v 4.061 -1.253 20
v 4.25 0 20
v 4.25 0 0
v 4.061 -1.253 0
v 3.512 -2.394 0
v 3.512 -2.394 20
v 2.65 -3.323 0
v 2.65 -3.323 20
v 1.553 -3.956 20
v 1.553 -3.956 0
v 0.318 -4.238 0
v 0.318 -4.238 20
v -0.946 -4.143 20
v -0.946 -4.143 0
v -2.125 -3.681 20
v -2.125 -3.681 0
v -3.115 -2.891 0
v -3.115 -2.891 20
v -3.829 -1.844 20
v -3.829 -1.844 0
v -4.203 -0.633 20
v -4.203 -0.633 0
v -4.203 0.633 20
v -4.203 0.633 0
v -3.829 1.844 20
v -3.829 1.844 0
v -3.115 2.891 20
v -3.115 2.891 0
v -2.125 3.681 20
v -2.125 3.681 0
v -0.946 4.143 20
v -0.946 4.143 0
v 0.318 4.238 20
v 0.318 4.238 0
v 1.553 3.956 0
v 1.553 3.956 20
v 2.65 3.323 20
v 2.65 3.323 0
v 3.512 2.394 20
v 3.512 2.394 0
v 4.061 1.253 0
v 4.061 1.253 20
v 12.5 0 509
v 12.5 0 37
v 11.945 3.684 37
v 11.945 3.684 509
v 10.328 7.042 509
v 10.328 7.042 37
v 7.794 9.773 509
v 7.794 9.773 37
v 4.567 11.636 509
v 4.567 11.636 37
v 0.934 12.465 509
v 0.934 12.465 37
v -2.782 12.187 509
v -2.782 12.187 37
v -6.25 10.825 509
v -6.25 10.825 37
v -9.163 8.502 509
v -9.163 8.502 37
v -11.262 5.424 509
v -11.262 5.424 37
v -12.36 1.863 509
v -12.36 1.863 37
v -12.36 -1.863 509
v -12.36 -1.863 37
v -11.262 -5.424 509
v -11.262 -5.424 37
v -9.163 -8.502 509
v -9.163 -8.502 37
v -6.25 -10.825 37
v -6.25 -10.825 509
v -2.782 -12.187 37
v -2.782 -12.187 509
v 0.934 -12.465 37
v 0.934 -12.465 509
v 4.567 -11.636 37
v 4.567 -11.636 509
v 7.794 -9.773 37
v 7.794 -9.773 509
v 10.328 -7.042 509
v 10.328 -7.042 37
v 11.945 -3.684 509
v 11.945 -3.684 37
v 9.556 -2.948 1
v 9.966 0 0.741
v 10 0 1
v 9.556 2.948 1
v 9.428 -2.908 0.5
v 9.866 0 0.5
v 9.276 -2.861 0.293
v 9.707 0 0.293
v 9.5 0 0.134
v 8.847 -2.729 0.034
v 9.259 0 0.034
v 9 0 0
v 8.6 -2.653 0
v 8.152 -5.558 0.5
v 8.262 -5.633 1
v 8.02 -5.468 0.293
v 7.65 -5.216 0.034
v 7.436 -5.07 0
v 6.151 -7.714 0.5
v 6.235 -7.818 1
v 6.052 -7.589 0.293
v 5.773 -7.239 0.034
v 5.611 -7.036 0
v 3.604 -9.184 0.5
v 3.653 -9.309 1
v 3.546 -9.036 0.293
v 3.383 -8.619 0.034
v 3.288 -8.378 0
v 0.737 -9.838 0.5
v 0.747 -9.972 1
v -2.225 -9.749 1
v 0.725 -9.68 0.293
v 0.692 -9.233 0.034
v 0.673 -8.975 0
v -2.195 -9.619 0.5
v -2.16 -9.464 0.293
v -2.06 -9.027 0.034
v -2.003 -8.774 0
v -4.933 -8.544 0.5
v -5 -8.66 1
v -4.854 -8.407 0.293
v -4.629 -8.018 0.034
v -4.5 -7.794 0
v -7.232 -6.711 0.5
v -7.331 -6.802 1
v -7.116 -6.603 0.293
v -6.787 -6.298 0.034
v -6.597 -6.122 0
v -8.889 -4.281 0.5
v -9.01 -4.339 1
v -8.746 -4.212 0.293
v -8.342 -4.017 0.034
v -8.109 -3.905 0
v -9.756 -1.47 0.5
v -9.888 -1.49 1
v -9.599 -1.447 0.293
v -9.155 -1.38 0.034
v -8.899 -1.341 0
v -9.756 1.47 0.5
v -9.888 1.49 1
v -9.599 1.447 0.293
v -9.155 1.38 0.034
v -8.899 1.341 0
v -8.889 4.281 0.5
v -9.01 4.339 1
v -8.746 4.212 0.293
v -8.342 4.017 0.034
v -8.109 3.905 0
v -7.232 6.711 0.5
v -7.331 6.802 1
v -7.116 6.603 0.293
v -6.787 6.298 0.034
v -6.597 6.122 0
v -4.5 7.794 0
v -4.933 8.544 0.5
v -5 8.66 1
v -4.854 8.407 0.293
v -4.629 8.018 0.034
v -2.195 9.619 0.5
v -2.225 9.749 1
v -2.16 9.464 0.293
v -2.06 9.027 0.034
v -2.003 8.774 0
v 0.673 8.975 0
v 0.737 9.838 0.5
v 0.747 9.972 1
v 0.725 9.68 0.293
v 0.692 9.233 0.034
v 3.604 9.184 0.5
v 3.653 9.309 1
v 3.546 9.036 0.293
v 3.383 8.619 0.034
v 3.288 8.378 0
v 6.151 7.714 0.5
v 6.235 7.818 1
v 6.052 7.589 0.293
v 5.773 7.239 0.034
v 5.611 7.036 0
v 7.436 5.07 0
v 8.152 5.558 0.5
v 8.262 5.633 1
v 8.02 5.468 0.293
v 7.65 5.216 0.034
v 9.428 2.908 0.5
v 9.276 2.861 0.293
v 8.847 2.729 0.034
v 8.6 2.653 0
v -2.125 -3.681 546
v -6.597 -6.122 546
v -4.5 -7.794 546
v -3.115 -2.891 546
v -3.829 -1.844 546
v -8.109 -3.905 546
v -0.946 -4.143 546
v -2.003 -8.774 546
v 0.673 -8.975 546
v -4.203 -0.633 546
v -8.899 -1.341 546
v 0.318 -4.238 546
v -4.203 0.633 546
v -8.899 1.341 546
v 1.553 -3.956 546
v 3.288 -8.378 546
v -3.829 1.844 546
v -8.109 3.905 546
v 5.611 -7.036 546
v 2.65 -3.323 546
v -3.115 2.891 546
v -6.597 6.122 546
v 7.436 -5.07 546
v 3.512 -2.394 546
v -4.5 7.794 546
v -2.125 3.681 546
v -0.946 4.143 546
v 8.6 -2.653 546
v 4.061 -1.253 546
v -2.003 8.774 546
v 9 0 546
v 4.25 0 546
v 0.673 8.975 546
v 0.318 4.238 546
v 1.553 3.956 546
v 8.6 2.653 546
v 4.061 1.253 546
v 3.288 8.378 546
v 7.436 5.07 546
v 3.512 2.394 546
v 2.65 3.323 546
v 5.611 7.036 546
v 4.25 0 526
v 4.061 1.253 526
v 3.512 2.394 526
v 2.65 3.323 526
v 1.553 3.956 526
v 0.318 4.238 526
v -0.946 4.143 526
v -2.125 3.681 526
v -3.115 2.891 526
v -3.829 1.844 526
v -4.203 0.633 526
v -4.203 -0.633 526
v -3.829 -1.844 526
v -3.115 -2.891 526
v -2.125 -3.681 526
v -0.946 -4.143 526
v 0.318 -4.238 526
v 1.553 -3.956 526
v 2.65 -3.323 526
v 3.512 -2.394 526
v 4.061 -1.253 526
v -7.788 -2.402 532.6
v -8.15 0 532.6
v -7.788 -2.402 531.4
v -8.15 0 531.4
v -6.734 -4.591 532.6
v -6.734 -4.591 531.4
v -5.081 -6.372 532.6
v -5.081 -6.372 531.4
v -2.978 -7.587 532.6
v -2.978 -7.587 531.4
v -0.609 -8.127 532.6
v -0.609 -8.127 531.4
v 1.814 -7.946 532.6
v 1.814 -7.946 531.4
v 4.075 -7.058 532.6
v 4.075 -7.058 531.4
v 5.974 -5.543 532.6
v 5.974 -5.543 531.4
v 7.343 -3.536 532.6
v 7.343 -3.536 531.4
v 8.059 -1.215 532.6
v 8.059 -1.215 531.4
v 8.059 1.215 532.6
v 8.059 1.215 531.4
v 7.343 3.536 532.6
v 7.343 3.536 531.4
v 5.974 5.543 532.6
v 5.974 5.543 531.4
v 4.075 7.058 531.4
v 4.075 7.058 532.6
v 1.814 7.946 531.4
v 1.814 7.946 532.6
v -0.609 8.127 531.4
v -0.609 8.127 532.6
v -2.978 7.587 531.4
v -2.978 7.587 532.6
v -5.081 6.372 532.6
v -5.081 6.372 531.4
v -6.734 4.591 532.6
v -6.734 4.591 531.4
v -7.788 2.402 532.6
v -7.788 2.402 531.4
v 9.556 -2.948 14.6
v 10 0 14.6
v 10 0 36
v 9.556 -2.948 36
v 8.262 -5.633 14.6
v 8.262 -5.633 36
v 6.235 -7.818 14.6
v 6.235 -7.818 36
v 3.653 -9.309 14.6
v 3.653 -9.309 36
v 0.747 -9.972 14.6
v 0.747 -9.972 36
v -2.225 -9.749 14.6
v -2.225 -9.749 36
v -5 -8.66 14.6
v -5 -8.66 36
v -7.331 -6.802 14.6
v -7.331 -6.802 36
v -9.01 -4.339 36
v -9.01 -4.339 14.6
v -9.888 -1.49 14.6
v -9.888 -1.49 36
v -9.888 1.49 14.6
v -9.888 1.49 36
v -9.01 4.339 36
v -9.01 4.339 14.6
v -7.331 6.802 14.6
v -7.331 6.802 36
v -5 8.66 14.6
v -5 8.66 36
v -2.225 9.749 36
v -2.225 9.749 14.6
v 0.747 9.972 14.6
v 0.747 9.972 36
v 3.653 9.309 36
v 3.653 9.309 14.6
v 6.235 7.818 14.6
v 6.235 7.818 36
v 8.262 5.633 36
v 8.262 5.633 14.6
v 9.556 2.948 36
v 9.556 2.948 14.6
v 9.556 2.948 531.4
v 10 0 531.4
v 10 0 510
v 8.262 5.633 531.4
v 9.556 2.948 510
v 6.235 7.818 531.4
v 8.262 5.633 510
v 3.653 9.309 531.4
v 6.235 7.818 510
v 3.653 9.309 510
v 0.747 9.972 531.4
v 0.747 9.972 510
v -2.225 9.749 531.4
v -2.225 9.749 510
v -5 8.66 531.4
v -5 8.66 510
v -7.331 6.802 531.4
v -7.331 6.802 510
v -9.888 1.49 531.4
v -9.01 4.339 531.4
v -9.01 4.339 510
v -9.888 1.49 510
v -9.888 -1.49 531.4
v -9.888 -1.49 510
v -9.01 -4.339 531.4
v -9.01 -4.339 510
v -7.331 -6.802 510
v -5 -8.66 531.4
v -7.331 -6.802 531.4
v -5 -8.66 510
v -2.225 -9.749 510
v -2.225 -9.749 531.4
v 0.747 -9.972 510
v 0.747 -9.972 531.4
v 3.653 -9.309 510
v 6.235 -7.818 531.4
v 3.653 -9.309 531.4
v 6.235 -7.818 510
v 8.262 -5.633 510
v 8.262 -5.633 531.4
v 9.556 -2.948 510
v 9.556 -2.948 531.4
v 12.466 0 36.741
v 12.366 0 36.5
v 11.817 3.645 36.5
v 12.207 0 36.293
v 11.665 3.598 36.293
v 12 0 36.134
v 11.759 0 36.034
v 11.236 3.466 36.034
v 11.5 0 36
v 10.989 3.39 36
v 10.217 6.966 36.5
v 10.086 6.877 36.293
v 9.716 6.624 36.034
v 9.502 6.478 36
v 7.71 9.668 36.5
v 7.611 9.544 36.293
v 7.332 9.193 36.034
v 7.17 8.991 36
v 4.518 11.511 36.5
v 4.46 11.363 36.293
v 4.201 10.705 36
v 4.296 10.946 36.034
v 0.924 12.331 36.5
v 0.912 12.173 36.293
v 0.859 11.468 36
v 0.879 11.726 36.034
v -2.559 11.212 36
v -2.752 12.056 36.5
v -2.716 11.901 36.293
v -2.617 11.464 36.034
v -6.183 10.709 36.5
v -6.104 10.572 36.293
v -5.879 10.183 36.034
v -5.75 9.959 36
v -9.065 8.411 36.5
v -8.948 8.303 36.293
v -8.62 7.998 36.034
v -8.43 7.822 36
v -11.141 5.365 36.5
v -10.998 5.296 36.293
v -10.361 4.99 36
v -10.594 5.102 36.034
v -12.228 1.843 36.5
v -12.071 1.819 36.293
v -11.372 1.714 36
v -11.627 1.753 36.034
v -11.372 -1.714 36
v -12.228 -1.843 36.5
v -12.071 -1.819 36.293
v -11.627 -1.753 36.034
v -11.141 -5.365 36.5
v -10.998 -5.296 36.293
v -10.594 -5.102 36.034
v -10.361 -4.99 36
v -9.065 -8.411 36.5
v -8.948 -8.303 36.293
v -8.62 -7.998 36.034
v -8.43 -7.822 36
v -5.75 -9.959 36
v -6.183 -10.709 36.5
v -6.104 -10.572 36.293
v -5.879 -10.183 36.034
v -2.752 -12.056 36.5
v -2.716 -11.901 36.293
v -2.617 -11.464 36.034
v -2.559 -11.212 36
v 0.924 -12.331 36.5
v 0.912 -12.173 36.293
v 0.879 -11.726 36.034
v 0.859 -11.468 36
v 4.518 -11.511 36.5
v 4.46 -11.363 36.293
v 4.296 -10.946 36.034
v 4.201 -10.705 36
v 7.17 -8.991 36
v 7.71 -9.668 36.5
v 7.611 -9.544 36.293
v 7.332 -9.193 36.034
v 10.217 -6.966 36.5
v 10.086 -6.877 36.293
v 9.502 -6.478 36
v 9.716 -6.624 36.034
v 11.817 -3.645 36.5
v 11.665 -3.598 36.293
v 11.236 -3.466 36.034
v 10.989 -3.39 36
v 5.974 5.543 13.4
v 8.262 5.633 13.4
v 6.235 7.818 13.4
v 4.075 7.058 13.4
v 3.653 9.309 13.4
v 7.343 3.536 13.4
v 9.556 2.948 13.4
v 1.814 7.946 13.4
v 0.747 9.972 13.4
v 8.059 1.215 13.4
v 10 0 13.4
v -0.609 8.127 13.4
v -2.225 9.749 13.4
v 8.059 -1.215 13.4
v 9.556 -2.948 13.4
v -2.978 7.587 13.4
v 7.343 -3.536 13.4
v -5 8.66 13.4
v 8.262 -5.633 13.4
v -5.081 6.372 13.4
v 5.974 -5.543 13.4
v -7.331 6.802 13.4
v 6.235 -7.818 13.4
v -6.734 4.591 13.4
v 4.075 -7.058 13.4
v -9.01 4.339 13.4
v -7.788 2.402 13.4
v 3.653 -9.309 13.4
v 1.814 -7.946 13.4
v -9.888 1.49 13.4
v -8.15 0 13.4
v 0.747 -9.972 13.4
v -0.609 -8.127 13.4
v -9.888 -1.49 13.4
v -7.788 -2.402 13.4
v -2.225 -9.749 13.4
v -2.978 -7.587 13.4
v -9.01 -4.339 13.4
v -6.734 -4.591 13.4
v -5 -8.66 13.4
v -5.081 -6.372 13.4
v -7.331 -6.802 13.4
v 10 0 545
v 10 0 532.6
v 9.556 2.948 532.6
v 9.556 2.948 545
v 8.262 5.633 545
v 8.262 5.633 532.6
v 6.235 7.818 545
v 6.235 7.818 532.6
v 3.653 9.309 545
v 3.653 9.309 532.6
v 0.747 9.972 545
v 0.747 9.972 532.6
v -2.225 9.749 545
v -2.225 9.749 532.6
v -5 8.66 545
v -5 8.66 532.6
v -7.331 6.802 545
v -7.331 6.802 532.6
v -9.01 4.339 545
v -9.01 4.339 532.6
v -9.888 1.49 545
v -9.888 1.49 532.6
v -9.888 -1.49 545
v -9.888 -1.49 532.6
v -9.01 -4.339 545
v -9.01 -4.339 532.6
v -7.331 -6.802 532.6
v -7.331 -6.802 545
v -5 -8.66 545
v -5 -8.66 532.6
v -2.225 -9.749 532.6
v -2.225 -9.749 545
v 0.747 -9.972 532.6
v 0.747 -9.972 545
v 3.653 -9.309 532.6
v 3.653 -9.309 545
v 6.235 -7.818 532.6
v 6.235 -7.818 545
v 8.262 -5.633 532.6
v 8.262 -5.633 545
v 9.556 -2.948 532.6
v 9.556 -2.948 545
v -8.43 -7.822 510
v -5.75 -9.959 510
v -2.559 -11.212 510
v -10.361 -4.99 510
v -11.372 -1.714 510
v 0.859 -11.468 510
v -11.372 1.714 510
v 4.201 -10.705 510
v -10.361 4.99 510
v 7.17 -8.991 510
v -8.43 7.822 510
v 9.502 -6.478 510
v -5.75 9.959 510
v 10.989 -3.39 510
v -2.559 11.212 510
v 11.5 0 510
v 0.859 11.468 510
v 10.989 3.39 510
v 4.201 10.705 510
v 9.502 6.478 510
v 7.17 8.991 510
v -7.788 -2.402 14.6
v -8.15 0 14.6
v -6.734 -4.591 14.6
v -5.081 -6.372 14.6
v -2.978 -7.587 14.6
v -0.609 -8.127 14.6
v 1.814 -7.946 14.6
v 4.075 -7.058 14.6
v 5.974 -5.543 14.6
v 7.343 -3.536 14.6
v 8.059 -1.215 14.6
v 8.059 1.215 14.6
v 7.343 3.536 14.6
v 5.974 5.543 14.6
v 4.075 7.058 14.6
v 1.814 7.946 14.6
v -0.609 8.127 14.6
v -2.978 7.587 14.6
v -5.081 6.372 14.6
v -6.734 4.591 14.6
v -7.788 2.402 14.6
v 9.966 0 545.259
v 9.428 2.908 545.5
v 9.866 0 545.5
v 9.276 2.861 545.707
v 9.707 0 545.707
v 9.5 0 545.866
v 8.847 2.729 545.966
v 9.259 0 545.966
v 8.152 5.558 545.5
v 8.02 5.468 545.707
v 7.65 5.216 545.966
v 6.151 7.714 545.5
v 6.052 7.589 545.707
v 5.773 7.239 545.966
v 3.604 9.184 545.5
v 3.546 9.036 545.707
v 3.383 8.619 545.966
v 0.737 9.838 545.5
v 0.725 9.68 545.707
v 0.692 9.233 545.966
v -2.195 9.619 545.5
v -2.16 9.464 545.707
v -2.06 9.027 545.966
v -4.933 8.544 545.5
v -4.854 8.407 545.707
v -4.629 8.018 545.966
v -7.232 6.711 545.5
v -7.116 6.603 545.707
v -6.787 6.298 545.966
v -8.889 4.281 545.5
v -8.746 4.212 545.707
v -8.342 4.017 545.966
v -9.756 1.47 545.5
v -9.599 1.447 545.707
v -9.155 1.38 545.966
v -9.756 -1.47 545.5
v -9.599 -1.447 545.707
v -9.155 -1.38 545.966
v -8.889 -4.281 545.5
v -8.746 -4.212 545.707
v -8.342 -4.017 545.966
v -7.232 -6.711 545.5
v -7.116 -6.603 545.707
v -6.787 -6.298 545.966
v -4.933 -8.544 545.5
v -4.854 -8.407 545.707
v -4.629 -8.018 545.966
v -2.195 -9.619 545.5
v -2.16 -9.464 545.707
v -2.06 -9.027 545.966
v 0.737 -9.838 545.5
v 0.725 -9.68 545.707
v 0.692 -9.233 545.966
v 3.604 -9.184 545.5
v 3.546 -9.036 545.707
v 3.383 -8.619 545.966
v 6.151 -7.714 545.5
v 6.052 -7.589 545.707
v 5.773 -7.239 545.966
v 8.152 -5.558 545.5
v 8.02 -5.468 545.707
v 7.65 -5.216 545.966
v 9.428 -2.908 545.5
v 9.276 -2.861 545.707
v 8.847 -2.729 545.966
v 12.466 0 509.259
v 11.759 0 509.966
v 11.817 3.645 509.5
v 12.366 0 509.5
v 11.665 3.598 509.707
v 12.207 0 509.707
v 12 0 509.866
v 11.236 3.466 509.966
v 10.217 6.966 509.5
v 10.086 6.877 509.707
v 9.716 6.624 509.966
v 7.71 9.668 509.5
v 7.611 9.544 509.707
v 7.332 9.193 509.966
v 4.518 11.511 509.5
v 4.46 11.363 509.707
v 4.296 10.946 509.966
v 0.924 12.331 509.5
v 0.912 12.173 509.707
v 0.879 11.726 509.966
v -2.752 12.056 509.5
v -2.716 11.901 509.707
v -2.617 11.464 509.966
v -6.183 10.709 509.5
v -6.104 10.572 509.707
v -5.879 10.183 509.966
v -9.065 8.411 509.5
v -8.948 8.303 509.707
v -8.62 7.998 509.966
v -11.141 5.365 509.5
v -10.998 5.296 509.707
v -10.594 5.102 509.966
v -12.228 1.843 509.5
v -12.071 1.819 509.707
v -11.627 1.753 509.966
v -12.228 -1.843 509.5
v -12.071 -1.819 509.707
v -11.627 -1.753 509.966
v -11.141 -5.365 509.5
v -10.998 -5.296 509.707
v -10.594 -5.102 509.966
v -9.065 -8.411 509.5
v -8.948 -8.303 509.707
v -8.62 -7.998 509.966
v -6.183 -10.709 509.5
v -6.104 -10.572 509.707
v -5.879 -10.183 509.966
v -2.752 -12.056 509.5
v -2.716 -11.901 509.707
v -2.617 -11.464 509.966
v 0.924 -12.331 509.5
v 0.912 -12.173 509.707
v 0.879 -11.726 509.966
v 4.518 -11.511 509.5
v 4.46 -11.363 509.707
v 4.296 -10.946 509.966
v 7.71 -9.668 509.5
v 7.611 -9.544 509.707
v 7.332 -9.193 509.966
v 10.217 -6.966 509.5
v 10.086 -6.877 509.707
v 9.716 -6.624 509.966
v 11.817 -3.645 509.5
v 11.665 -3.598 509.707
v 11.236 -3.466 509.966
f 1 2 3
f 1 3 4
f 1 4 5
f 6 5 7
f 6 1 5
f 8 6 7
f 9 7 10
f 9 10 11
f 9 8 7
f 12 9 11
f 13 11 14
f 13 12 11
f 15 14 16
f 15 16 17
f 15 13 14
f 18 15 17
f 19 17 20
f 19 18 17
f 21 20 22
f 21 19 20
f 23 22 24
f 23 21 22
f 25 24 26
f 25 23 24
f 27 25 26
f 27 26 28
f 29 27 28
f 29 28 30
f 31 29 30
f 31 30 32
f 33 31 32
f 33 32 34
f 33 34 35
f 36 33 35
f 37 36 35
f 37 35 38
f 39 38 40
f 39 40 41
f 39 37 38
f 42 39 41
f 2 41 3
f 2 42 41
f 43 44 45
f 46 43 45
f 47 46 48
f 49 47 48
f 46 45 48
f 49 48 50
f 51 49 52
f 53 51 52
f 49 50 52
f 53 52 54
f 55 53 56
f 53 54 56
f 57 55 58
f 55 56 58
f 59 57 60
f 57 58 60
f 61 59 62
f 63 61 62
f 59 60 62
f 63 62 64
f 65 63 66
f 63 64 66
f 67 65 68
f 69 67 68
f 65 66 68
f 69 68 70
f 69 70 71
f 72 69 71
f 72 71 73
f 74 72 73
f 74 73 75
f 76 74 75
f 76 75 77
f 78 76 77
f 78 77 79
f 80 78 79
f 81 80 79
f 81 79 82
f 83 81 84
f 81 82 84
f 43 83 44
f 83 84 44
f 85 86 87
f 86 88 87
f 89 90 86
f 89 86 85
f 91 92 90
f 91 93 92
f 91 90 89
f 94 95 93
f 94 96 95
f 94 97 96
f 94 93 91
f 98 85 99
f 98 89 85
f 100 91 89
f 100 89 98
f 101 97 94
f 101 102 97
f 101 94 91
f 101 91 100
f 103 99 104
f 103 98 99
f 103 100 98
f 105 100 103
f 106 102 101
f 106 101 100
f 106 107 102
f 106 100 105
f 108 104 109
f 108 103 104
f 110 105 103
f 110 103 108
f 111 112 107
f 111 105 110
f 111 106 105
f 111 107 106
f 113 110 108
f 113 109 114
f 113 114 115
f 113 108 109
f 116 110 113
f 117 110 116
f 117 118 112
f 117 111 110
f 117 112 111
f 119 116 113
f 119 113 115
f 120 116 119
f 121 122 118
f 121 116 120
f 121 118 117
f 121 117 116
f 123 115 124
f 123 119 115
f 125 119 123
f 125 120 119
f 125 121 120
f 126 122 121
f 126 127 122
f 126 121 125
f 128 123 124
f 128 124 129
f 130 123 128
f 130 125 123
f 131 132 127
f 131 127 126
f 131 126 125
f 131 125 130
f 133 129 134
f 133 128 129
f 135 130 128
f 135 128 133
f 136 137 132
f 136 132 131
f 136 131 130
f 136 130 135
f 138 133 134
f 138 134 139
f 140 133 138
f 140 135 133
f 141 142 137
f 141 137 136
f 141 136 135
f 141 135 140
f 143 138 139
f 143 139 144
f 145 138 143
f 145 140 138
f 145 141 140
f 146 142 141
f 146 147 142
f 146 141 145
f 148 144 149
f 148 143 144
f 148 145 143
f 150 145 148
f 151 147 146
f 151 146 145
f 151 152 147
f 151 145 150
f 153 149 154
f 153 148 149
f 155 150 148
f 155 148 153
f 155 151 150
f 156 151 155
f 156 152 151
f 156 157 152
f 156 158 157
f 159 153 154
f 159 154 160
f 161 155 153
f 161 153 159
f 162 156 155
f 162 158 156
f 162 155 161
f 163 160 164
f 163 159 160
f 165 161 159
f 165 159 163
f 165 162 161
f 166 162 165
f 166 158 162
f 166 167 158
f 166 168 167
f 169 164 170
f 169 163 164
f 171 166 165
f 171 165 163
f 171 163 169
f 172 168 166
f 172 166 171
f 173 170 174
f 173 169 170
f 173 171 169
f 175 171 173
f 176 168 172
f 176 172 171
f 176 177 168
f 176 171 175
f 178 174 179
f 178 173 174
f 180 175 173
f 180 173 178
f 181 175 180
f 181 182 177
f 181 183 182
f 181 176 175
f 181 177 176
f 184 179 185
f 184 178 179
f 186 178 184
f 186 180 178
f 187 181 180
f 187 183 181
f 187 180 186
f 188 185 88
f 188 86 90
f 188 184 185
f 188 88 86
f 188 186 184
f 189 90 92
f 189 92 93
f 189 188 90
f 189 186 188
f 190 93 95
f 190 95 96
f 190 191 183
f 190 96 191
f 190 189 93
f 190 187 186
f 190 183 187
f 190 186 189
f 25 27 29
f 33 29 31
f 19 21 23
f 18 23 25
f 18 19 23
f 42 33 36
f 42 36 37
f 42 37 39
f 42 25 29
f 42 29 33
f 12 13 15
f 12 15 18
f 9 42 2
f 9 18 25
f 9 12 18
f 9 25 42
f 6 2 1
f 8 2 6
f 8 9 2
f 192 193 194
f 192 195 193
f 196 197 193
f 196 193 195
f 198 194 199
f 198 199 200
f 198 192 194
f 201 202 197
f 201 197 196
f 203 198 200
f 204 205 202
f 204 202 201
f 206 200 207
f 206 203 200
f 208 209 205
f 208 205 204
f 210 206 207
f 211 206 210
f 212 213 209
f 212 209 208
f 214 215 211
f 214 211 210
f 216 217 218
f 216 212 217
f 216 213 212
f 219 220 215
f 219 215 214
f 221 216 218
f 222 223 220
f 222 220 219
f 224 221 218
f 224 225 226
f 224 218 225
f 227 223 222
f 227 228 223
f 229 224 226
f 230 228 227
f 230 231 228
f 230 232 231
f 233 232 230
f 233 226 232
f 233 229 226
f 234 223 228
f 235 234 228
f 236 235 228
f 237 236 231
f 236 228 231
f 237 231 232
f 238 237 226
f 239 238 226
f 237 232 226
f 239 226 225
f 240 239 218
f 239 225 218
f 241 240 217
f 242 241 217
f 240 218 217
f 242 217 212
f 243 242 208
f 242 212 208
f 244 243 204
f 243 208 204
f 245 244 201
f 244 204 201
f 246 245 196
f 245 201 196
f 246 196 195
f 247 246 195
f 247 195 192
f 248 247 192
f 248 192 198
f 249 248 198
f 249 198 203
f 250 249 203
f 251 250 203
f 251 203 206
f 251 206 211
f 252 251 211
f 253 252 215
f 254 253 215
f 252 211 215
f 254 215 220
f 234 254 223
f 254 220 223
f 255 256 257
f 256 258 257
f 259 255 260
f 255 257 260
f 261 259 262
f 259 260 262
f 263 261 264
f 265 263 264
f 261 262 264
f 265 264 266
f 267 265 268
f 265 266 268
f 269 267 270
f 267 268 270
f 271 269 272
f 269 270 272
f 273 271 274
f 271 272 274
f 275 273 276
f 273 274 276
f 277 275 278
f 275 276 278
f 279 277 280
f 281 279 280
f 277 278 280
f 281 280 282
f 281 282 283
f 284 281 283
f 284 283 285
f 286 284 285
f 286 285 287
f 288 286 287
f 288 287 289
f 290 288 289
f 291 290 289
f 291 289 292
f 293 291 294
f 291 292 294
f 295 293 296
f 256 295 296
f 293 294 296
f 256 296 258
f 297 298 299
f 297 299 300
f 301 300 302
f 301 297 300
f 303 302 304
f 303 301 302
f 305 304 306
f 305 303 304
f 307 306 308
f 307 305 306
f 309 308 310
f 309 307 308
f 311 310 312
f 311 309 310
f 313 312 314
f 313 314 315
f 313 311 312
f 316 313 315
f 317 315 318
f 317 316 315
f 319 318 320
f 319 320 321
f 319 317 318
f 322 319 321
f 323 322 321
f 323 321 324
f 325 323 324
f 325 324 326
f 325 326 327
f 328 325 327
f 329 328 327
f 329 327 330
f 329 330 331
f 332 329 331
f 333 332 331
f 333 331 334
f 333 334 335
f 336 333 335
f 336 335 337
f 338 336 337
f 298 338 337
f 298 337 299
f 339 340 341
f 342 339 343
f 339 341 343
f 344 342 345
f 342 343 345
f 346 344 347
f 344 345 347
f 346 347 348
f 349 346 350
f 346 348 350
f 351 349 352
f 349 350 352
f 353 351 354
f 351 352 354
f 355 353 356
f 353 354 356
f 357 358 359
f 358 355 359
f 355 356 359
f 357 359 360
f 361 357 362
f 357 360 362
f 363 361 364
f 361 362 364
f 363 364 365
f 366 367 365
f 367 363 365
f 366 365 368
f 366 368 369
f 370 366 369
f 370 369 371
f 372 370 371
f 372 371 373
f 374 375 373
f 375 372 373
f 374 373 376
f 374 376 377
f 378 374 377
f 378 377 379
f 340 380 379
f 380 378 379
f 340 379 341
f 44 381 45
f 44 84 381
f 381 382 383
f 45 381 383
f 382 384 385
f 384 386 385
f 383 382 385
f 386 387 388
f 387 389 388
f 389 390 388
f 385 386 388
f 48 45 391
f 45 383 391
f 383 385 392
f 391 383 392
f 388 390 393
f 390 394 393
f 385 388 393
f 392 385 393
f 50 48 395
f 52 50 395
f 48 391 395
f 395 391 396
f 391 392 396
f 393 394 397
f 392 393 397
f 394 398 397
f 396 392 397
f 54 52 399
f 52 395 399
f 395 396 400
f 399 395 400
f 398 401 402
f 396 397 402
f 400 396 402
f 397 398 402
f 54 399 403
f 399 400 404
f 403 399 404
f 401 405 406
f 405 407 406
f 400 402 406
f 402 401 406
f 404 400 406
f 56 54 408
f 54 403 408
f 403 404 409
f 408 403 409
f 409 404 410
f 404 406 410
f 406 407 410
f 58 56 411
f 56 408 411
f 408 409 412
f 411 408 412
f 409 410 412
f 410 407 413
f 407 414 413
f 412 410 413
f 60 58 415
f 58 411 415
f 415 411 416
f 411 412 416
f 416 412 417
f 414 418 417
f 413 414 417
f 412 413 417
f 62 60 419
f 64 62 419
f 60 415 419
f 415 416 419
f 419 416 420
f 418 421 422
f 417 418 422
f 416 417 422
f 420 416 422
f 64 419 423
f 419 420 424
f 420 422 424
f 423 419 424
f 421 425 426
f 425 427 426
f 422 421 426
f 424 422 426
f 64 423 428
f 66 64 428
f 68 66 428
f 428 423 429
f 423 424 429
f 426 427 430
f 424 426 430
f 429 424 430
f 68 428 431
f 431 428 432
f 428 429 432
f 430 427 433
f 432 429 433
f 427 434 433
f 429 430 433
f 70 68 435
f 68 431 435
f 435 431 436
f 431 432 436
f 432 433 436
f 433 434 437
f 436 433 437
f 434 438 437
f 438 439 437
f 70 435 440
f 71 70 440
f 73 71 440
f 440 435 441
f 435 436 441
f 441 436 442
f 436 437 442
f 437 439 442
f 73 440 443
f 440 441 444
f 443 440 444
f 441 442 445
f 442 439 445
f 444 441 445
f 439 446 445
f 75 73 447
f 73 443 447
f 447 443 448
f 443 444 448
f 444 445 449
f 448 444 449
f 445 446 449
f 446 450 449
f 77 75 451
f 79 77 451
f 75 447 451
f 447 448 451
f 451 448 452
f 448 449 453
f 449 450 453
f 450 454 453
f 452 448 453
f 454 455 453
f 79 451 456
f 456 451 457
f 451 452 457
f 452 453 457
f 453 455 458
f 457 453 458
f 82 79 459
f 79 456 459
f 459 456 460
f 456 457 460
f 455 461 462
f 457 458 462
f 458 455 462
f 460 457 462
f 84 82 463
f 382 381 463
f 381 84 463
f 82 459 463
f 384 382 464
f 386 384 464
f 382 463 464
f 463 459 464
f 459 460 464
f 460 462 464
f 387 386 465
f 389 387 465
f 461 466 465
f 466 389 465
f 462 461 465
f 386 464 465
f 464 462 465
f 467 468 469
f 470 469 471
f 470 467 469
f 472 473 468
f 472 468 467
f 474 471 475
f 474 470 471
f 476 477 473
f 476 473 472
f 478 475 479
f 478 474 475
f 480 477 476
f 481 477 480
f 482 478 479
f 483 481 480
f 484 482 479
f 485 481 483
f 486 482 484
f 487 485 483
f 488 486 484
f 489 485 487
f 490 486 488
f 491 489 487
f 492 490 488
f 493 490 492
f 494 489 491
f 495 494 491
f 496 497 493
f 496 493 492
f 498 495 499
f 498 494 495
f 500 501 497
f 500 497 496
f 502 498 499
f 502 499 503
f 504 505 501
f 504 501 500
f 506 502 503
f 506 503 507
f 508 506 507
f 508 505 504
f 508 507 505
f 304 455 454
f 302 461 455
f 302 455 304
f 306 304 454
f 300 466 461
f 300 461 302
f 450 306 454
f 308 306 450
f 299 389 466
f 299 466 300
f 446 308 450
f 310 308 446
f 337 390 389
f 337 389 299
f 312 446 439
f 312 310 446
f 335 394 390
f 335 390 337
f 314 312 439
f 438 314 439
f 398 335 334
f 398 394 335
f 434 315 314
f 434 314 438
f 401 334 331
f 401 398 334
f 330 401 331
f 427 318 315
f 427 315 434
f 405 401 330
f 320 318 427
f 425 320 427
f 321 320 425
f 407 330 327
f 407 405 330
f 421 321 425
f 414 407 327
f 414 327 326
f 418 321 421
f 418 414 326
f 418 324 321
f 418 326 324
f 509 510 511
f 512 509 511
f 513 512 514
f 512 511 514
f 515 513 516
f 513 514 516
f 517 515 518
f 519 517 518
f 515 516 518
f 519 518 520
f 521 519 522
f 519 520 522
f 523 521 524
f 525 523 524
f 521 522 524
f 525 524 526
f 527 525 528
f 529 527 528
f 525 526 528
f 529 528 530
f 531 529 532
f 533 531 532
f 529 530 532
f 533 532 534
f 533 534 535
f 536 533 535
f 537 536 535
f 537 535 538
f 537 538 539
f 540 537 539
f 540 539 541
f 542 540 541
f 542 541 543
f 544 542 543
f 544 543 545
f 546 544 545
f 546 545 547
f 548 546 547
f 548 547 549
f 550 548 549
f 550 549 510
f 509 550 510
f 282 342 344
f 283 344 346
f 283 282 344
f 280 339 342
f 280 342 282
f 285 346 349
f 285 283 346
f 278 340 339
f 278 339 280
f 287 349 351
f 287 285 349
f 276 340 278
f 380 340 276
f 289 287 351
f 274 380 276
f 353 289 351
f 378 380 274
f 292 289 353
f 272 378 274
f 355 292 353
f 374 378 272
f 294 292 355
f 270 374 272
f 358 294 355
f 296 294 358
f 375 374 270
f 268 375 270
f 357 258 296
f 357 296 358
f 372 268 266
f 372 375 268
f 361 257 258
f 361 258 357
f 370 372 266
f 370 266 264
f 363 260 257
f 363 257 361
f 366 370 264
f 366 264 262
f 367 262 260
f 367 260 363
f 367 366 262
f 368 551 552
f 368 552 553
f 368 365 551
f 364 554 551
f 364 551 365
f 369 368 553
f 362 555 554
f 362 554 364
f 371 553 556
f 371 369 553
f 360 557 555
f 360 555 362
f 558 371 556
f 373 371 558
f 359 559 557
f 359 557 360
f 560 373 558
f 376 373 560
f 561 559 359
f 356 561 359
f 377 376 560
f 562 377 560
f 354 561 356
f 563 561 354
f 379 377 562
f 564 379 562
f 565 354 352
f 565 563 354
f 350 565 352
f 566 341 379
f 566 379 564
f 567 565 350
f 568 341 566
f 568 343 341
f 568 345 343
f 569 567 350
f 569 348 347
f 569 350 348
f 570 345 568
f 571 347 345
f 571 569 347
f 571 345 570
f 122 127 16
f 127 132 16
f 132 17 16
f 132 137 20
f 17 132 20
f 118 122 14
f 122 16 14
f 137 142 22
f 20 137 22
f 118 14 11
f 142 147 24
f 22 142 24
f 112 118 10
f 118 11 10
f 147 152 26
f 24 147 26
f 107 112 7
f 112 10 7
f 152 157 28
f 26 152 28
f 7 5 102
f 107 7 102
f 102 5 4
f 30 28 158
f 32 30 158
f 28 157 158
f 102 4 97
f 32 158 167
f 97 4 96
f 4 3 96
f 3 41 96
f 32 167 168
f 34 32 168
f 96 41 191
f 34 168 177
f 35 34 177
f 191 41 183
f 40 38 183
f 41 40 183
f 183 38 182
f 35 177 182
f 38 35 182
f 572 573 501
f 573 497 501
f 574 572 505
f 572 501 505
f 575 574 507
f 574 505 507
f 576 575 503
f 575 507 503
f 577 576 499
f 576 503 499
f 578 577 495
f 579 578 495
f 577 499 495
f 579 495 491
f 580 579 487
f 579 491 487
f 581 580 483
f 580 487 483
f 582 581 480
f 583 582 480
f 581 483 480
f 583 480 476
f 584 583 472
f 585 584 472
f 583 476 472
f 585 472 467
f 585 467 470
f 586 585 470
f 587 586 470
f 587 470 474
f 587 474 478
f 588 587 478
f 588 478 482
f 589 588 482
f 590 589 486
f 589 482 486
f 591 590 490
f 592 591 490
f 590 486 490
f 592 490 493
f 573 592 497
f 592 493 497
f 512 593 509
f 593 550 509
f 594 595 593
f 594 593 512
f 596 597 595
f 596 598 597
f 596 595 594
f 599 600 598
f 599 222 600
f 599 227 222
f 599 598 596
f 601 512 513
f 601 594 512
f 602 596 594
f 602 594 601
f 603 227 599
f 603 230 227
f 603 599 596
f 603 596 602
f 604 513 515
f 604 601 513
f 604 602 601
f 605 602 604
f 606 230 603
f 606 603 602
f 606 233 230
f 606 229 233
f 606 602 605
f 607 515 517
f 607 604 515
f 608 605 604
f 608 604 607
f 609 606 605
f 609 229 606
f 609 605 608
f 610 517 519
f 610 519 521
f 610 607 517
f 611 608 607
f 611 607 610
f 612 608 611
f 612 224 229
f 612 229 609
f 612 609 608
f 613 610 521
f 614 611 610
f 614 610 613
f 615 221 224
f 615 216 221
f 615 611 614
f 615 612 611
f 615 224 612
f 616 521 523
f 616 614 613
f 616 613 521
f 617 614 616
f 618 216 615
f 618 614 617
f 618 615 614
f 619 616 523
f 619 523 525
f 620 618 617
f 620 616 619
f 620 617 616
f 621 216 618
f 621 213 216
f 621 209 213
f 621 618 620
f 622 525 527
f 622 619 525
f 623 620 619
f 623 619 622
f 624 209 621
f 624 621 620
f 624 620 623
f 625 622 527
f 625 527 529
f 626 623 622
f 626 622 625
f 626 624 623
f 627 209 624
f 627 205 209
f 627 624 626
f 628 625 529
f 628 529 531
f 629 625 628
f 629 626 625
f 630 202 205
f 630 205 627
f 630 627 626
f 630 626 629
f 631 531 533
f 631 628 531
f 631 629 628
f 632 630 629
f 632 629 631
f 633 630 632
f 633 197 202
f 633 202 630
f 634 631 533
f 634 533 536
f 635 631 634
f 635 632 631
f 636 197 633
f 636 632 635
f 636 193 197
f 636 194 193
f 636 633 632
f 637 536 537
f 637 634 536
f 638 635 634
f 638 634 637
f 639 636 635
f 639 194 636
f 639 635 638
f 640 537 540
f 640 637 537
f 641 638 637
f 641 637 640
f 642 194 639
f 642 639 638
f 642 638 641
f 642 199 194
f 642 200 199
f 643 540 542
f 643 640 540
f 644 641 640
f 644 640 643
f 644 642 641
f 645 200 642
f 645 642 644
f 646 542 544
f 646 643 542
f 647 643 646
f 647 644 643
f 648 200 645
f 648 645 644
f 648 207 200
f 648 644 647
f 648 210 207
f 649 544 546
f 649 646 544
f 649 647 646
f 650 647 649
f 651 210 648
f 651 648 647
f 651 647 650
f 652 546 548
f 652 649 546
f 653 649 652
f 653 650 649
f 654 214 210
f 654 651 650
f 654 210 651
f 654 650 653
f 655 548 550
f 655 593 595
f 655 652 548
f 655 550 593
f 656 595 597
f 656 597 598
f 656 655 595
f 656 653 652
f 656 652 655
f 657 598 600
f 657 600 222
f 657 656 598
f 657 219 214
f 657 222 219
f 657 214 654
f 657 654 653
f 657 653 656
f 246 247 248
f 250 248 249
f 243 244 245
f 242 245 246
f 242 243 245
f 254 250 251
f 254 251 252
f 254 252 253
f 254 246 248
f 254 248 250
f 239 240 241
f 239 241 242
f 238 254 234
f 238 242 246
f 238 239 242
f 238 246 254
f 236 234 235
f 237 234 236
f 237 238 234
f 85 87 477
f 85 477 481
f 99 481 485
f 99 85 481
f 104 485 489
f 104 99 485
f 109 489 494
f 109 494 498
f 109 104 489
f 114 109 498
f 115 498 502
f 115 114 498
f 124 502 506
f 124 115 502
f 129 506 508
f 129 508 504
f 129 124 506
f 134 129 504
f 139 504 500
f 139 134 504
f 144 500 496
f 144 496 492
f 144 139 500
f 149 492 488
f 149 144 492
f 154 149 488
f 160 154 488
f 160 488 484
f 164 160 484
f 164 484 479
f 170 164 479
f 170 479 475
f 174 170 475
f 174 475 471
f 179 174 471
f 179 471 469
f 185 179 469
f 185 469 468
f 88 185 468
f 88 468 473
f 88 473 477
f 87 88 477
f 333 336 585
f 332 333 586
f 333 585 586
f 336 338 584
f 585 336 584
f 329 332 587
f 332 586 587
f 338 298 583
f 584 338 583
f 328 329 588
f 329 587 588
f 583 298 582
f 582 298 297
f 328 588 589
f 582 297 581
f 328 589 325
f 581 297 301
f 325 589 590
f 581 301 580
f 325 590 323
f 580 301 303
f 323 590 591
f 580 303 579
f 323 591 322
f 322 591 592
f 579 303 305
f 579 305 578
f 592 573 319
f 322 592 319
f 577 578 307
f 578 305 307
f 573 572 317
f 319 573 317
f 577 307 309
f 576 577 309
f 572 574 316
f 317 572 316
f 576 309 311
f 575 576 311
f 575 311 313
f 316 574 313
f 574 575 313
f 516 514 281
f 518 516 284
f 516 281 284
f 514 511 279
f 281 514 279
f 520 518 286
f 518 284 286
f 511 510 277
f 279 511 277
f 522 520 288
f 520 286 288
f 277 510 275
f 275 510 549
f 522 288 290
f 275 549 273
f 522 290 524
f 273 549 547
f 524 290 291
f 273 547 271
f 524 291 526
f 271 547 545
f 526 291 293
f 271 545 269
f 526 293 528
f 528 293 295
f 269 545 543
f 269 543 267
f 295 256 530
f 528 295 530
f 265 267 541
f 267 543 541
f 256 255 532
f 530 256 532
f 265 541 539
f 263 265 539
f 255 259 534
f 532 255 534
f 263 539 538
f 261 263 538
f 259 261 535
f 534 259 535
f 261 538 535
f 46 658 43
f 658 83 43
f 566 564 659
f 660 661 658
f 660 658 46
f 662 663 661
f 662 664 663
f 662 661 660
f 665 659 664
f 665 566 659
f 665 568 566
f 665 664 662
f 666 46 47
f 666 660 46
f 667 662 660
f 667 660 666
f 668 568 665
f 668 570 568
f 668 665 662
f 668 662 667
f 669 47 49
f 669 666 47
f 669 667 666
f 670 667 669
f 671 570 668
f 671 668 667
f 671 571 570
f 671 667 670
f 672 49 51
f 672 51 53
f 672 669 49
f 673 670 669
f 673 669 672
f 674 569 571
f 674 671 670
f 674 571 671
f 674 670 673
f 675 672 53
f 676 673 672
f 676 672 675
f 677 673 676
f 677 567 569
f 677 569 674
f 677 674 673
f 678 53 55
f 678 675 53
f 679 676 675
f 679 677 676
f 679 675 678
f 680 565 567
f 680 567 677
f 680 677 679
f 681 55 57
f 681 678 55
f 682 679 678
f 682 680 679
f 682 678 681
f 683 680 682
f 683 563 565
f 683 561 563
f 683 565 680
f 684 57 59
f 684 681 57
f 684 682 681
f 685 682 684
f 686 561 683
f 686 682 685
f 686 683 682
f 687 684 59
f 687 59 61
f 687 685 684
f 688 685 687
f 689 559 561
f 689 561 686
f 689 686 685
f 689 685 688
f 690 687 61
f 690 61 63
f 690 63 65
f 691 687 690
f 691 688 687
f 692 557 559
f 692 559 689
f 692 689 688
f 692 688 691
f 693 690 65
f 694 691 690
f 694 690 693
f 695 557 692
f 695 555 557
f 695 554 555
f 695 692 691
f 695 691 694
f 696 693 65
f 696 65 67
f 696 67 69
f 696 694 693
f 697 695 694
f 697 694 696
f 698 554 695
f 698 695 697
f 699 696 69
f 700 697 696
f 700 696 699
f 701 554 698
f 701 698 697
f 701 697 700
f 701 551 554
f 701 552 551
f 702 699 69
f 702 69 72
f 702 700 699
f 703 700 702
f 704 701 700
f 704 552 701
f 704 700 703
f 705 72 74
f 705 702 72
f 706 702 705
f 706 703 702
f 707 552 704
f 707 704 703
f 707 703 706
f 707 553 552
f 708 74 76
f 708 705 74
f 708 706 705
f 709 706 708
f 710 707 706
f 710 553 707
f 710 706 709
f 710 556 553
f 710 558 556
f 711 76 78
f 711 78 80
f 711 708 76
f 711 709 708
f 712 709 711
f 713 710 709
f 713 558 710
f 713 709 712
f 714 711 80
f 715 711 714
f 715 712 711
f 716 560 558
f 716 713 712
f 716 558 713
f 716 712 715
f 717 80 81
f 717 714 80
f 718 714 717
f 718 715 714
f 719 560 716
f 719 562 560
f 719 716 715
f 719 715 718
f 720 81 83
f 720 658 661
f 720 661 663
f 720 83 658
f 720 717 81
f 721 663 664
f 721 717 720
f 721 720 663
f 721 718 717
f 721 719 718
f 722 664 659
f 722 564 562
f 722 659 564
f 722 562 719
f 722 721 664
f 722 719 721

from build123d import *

# Parameters (mm, degrees)
IZIM1_R                     = 12.5
Y_KSEKLIK_EKSTR_ZYON1_DEPTH = 546
IZIM2_R                     = 4.25
KES_EKSTR_ZYON1_DEPTH       = 20
KES_EKSTR_ZYON2_START       = -20
IZIM3_R                     = 4.25
KES_EKSTR_ZYON2_DEPTH       = 20
KES_EKSTR_ZYON3_START       = -36
IZIM4_R                     = 12.5
IZIM4_R_2                   = 10
KES_EKSTR_ZYON3_DEPTH       = 36
IZIM5_R                     = 12.5
IZIM5_R_2                   = 10
KES_EKSTR_ZYON4_DEPTH       = 36
IZIM8_W                     = 3.7
IZIM8_H                     = 1.2
RADYUS1_R                   = 1


with BuildPart() as part:
    # Çizim1 → Yükseklik-Ekstrüzyon1 (new body)
    with BuildSketch(Plane.XY):
        Circle(IZIM1_R)
    extrude(amount=Y_KSEKLIK_EKSTR_ZYON1_DEPTH)

    # Çizim2 → Kes-Ekstrüzyon1 (cut)
    with BuildSketch(Plane.XY.offset(546)):
        Circle(IZIM2_R)
    extrude(amount=-KES_EKSTR_ZYON1_DEPTH, mode=Mode.SUBTRACT)

    # Çizim3 → Kes-Ekstrüzyon2 (cut)
    with BuildSketch(Plane(origin=(0, 0, 0), x_dir=(-1, 0, 0), z_dir=(0, 0, -1)).offset(KES_EKSTR_ZYON2_START)):
        with Locations(Location((0, 0, 0), (0, 0, 180))):
            Circle(IZIM3_R)
    extrude(amount=KES_EKSTR_ZYON2_DEPTH, mode=Mode.SUBTRACT)

    # Çizim4 → Kes-Ekstrüzyon3 (cut)
    with BuildSketch(Plane.XY.offset(546).offset(KES_EKSTR_ZYON3_START)):
        Circle(IZIM4_R)
        Circle(IZIM4_R_2, mode=Mode.SUBTRACT)
    extrude(amount=KES_EKSTR_ZYON3_DEPTH, mode=Mode.SUBTRACT)

    # Çizim5 → Kes-Ekstrüzyon4 (cut)
    with BuildSketch(Plane(origin=(0, 0, 0), x_dir=(-1, 0, 0), z_dir=(0, 0, -1))):
        Circle(IZIM5_R)
        with Locations(Location((0, 0, 0), (0, 0, 180))):
            Circle(IZIM5_R_2, mode=Mode.SUBTRACT)
    extrude(amount=-KES_EKSTR_ZYON4_DEPTH, mode=Mode.SUBTRACT)

    # Çizim8 → Kes-Döndür1 (revolve, cut)
    with BuildSketch(Plane(origin=(0, 0, 0), x_dir=(1, 0, 0), z_dir=(0, 1, 0))):
        with Locations((-10, -14)):
            Rectangle(IZIM8_W, IZIM8_H)
        with Locations((-10, -532)):
            Rectangle(IZIM8_W, IZIM8_H)
    revolve(axis=Axis((0, 0, 0), (0, 0, 1)), mode=Mode.SUBTRACT)

    # Radyus1
    radyus1_edges = [part.edges().sort_by_distance(p)[0] for p in [
        (-12.5, 0, 510),
        (-10, 0, 546),
        (-12.5, 0, 36),
        (-10, 0, 0),
    ]]
    fillet(radyus1_edges, radius=RADYUS1_R)


solid = part.part
